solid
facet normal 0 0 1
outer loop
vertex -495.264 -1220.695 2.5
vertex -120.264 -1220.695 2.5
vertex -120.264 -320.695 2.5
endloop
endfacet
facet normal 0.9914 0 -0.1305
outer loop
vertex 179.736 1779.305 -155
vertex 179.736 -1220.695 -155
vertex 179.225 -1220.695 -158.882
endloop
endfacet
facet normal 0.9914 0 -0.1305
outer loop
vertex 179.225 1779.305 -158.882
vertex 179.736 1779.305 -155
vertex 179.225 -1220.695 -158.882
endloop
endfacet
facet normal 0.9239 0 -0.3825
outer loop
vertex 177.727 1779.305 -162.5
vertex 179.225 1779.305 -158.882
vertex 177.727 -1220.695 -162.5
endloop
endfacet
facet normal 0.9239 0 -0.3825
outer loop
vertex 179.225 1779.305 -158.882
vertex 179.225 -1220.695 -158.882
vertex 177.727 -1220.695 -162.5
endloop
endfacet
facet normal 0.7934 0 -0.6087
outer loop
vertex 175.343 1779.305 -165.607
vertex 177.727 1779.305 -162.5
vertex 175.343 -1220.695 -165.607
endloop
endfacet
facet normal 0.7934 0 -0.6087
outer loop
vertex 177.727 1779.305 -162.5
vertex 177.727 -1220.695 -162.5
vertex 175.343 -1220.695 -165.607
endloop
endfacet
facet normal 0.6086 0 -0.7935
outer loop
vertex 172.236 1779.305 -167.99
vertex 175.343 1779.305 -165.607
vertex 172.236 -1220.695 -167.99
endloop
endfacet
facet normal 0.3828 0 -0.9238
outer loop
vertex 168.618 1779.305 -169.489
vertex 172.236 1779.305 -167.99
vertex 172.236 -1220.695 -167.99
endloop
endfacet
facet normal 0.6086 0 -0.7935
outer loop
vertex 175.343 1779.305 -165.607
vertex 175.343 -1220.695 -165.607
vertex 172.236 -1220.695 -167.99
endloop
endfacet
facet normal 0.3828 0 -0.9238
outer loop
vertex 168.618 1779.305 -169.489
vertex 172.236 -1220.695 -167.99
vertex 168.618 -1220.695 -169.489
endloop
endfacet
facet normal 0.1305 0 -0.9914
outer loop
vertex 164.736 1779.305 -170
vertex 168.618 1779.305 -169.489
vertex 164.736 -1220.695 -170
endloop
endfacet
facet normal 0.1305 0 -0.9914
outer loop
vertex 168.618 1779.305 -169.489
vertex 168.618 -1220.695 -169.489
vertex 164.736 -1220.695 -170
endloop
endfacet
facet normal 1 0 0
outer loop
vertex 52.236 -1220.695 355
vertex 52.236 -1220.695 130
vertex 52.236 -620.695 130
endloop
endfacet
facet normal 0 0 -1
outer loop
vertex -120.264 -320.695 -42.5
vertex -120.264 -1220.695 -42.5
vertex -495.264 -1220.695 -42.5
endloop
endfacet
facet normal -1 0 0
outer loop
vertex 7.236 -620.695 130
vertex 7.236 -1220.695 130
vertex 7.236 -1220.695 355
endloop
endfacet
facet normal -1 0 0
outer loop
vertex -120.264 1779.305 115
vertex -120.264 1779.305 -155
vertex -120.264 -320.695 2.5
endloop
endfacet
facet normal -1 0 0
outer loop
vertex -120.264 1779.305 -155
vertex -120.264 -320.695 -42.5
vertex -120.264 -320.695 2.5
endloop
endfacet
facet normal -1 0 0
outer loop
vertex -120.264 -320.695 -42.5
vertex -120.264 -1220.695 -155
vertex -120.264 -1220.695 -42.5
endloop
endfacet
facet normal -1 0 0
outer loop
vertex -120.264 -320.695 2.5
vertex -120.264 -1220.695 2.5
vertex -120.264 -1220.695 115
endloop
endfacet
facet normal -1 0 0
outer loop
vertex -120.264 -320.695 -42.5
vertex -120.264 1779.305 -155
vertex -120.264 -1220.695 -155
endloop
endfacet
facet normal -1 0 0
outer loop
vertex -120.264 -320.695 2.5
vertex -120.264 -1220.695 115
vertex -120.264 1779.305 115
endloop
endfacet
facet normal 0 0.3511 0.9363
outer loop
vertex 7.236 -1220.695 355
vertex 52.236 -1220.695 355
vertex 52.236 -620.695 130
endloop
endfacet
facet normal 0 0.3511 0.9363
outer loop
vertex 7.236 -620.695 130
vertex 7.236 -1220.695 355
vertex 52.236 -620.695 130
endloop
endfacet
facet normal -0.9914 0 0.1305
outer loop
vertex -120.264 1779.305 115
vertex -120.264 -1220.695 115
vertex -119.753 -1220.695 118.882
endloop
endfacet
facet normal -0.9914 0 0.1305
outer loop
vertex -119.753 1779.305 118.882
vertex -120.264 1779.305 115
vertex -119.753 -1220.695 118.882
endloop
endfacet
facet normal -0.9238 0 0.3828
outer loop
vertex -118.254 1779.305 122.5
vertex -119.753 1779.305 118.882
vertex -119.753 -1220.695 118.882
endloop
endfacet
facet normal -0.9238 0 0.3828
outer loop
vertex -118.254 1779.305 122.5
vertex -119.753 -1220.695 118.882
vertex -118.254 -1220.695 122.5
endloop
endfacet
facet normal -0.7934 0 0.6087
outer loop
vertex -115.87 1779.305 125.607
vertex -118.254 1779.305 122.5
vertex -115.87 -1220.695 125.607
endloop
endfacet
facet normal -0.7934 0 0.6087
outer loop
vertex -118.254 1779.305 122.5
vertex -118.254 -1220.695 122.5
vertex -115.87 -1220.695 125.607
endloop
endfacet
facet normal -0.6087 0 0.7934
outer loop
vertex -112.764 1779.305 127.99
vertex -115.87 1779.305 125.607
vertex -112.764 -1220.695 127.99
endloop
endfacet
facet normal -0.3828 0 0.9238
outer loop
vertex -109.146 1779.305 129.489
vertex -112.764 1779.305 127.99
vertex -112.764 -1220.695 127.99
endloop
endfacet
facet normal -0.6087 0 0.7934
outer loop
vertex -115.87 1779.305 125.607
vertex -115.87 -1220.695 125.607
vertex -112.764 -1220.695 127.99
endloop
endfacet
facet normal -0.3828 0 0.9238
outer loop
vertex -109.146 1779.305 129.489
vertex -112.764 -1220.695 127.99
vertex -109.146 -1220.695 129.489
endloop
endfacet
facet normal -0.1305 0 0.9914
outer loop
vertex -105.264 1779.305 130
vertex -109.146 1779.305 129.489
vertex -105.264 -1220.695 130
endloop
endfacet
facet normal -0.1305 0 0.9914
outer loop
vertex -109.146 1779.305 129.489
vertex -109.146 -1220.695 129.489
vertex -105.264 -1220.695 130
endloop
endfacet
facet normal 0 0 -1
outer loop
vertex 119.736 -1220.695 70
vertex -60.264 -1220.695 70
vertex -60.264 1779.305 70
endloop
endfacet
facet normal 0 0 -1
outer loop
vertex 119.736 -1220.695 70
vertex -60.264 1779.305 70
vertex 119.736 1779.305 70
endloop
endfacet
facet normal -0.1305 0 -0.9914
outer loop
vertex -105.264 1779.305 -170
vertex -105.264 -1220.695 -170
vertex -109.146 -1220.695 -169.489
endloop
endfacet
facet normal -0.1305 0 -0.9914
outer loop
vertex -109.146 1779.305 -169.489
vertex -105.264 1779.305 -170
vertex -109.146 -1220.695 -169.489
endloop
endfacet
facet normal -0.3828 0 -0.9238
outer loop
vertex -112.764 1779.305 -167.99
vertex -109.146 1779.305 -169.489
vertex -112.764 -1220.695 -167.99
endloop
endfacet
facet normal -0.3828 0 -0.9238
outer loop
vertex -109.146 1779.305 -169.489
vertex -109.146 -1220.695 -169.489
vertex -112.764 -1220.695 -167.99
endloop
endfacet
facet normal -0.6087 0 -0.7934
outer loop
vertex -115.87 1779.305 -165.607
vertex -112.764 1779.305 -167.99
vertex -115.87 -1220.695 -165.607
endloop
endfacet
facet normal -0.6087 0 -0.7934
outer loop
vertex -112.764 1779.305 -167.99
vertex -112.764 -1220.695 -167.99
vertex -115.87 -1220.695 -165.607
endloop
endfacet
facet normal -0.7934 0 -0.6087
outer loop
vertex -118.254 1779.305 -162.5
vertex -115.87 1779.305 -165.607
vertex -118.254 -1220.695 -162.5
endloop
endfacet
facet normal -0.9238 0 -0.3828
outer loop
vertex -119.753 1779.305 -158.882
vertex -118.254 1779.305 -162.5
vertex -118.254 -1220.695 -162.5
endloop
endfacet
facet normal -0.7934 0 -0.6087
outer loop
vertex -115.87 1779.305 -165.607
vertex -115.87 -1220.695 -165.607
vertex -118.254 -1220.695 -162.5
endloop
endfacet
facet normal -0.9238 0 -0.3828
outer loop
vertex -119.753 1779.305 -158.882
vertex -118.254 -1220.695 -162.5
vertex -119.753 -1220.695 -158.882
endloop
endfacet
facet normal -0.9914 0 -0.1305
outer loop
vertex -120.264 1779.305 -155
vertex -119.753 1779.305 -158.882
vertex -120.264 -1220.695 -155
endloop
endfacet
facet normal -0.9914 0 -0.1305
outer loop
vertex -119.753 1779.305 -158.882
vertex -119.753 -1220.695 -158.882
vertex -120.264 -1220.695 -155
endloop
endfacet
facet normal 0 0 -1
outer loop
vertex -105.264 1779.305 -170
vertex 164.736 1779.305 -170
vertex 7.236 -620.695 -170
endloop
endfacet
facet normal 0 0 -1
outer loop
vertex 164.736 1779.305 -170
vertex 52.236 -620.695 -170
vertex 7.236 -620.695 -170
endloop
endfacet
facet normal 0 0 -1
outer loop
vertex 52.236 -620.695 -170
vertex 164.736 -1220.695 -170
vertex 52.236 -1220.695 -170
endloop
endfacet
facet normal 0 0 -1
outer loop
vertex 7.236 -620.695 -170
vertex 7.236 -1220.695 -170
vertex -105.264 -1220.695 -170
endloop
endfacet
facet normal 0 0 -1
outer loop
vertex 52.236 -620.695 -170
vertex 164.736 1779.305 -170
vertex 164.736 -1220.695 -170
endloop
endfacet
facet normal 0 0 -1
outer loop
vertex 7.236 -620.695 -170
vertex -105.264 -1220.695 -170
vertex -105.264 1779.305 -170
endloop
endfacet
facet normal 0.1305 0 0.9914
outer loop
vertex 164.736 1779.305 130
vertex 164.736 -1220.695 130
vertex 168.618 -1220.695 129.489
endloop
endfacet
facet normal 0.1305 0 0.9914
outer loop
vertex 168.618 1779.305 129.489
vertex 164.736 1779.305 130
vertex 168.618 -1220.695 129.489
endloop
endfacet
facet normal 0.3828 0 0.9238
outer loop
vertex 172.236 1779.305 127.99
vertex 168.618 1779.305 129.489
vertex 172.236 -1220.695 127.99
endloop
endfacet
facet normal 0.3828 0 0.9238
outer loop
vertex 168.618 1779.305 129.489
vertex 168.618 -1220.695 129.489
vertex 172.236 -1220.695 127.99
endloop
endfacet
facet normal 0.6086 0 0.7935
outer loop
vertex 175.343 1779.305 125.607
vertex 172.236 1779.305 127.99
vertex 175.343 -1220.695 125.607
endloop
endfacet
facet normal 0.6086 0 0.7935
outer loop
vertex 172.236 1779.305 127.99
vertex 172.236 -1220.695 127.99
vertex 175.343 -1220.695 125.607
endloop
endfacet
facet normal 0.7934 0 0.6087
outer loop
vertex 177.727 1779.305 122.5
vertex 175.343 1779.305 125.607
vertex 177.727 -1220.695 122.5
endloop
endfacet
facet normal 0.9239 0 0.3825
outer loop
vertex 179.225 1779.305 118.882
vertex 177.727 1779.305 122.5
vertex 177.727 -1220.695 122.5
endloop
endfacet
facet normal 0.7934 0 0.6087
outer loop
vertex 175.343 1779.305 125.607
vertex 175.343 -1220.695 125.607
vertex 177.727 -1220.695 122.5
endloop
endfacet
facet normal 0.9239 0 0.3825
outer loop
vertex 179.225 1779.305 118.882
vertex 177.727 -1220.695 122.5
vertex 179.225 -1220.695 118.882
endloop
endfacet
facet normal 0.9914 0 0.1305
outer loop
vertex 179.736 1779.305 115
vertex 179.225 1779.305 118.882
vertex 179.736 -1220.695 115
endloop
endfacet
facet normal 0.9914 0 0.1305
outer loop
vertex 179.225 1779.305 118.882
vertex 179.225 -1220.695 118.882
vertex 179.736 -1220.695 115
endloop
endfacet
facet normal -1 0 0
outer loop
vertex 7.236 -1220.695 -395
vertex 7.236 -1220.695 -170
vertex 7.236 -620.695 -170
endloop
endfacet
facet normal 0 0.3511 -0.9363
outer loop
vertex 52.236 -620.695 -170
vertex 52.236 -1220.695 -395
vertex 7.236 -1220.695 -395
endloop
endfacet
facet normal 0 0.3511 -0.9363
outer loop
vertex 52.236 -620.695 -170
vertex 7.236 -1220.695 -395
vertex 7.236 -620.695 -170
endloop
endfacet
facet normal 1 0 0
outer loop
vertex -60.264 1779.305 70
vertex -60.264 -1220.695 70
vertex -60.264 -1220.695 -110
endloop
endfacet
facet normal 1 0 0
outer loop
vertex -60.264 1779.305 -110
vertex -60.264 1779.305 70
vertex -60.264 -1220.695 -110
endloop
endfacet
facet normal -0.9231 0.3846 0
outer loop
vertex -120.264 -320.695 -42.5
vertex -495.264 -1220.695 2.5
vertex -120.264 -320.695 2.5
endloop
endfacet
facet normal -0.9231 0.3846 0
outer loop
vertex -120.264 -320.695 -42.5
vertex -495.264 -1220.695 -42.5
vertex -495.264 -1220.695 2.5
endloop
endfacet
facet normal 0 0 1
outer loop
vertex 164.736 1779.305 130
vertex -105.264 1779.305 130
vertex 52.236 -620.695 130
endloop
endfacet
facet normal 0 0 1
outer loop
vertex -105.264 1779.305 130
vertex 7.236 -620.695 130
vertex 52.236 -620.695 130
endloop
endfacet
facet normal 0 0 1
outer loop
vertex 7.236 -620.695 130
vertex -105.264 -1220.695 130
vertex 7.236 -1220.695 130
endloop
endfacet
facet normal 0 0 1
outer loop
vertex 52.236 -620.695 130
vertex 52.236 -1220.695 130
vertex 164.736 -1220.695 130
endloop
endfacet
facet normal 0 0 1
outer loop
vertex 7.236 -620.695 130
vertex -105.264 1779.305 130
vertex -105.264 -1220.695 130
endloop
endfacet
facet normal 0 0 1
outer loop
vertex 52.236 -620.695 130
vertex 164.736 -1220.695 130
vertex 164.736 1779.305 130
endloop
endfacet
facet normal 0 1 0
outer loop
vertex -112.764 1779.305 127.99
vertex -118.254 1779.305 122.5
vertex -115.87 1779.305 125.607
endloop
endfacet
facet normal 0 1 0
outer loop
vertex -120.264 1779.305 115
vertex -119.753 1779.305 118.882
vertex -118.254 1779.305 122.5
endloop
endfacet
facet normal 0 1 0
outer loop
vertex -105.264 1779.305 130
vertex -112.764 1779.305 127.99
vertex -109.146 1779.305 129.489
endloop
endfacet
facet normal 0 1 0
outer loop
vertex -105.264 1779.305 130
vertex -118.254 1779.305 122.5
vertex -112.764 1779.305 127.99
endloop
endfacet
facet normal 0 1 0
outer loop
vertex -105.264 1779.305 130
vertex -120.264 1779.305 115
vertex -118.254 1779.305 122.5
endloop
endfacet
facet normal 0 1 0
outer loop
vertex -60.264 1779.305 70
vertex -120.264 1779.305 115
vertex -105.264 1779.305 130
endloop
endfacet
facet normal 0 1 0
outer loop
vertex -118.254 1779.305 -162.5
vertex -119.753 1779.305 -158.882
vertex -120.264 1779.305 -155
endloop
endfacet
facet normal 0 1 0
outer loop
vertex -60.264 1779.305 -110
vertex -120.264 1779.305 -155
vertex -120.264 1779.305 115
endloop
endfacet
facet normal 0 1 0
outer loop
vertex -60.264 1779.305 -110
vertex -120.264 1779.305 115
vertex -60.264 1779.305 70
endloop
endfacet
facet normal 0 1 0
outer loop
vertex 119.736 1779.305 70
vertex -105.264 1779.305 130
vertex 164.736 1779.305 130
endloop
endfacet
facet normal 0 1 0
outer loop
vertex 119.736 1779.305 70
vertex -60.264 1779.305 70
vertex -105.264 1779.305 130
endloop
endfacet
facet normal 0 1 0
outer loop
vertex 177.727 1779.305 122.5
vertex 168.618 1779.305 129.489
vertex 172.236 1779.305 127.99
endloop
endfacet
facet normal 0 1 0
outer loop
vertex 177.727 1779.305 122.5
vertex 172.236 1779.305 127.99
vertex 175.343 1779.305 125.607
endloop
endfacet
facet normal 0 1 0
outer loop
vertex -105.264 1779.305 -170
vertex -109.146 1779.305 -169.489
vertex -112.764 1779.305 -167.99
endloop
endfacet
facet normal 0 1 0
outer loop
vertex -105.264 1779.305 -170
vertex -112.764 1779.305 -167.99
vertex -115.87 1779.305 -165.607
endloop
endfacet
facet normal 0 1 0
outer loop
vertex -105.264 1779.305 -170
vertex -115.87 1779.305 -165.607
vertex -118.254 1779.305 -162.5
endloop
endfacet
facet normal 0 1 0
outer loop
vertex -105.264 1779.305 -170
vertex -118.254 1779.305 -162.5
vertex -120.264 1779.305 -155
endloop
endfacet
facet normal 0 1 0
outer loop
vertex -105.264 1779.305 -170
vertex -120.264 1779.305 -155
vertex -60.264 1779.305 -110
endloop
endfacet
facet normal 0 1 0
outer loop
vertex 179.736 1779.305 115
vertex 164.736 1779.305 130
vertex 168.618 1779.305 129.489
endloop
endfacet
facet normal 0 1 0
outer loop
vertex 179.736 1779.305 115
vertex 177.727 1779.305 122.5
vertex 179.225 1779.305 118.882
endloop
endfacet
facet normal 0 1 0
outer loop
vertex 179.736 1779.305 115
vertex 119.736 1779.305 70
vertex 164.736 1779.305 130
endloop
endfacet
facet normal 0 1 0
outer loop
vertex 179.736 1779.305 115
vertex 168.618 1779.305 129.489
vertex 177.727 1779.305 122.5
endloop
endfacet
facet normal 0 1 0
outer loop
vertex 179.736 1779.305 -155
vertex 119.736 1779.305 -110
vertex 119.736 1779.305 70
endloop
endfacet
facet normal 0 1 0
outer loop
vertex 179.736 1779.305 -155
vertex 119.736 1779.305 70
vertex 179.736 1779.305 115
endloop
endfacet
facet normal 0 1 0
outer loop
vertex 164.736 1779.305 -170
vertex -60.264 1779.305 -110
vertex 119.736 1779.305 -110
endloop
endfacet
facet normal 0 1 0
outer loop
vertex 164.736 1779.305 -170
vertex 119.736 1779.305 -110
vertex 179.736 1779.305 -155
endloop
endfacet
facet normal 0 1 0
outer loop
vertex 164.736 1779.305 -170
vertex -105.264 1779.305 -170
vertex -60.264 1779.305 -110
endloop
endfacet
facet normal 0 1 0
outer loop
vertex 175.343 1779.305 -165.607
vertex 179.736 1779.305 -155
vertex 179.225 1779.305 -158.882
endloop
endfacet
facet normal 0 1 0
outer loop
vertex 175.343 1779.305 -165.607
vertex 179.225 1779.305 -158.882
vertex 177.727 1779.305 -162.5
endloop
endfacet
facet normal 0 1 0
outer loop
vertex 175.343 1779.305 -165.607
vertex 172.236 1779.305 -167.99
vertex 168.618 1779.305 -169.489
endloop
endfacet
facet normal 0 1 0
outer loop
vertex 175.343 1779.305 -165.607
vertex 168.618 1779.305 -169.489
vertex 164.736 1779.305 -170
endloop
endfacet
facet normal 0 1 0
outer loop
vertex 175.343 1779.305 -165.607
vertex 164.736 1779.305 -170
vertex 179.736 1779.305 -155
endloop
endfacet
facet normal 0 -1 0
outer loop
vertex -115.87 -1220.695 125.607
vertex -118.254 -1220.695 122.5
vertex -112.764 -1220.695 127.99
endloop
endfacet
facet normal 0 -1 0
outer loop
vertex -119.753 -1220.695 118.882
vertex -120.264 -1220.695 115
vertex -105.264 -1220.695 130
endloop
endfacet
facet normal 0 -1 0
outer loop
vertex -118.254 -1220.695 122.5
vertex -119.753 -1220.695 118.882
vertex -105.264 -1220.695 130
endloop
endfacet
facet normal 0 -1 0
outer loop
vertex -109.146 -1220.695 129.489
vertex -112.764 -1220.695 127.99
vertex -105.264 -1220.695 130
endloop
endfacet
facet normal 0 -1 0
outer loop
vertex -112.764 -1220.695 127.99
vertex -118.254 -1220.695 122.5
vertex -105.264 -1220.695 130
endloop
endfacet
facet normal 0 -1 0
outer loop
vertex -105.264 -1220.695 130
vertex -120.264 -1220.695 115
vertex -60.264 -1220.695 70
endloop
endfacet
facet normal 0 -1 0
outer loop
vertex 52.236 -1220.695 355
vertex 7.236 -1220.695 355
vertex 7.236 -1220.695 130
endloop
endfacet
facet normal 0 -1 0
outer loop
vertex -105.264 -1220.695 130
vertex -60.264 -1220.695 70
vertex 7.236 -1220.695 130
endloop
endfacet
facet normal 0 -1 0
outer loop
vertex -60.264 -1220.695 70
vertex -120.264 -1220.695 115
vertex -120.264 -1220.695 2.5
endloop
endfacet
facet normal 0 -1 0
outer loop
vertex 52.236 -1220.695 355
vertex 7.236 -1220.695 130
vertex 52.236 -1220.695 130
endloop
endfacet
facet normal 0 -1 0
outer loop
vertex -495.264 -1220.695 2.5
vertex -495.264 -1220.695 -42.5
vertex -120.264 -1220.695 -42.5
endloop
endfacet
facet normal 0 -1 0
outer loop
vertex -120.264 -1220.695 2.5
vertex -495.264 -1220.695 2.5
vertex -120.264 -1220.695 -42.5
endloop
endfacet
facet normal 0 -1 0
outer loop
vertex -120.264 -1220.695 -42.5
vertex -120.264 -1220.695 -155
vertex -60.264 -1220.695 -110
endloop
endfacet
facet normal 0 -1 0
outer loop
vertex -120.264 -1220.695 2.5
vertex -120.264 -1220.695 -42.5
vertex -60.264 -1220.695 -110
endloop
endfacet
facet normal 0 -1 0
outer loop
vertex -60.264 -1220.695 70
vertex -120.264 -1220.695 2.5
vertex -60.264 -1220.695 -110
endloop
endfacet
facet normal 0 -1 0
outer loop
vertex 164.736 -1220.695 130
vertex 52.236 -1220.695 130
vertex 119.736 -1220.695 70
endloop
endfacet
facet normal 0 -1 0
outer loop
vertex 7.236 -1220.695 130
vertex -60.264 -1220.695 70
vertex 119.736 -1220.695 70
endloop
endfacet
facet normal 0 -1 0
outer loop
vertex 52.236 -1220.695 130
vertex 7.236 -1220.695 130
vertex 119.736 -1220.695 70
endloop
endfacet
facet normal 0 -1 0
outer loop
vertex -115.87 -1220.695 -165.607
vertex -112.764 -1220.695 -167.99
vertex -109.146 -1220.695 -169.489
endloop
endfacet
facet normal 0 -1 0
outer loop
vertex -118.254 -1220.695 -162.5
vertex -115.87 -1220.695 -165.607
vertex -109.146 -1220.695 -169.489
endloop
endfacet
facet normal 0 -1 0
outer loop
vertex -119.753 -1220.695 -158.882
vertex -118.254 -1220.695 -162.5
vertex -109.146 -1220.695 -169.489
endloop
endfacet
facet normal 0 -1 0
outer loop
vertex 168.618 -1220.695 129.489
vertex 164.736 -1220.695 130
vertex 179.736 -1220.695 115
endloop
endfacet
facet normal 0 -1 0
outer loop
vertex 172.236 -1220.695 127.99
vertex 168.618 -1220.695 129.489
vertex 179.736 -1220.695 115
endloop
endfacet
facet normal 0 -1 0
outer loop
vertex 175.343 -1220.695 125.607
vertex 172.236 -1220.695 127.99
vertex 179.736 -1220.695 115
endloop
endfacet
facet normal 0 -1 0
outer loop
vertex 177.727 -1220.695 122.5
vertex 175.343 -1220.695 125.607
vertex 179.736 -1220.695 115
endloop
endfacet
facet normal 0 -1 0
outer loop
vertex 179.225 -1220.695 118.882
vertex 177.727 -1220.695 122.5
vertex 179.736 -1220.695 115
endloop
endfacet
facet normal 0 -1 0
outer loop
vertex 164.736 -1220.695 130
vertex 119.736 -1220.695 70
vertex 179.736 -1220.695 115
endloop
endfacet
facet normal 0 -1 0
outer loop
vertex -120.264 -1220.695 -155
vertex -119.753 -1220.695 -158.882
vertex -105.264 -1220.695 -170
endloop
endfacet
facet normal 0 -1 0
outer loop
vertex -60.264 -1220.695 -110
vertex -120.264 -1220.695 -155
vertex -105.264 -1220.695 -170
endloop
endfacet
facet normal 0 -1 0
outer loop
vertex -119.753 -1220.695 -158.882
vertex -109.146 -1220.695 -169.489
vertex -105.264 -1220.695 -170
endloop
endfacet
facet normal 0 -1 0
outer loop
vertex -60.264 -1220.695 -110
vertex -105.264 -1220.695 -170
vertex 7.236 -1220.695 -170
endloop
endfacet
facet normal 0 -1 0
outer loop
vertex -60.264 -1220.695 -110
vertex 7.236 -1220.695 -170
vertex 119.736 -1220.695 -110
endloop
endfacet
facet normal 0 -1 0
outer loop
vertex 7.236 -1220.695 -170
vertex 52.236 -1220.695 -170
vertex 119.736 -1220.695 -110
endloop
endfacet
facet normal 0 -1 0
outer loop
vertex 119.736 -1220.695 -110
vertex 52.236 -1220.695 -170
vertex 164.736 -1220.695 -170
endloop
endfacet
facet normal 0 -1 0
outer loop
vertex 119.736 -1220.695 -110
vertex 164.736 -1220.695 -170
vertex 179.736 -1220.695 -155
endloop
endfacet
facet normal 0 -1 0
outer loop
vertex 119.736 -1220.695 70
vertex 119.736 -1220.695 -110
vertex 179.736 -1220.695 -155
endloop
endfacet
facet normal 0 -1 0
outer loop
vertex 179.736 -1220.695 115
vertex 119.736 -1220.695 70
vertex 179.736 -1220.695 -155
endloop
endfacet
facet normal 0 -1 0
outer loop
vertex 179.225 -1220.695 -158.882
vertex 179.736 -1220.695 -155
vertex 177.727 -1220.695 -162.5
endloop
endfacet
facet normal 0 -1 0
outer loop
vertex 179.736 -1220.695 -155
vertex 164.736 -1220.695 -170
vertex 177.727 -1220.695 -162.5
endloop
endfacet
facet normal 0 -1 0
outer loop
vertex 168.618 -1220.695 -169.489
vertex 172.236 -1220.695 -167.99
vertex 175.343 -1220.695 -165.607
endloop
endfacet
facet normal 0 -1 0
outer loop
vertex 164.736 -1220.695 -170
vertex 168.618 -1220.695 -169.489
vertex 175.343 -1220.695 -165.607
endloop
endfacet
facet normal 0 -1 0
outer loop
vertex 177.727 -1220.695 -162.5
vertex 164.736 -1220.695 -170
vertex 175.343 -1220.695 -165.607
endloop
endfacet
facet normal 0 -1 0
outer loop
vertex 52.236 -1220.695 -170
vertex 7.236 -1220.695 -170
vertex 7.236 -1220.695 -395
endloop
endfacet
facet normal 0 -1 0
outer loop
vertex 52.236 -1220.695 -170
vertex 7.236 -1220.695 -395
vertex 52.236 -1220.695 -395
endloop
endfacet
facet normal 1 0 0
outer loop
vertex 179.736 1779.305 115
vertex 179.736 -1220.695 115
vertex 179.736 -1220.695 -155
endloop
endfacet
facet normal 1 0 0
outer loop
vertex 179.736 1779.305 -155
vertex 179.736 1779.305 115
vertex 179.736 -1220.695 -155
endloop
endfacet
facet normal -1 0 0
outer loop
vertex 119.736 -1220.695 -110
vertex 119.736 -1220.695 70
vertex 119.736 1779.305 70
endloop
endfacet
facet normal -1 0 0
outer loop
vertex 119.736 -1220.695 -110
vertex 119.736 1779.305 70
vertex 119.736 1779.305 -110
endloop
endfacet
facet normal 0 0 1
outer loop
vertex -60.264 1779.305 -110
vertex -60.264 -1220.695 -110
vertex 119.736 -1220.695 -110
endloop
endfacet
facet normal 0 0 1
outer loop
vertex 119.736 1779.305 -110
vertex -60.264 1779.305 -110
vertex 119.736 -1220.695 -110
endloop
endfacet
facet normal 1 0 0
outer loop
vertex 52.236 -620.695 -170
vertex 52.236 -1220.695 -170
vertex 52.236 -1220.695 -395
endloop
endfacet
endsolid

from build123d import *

# Parameters (mm, degrees)
SKETCH1_W           = 24
SKETCH1_H           = 24
BOSS_EXTRUDE1_DEPTH = 400
RIB2_START          = -3
RIB2_DEPTH          = 6
BOSS_EXTRUDE2_DEPTH = 3
SCALE3_SCALE        = 7.5


# Read off the part's stored shape, not the designer's step: Rib2
with BuildPart() as part:
    # Sketch1 → Boss-Extrude1 (new body)
    with BuildSketch(Plane(origin=(0, 0, 0), x_dir=(1, 0, 0), z_dir=(0, 1, 0))):
        with BuildLine():
            Line((2, 0), (38, 0))
            ThreePointArc((38, 0), (39.414213562, 0.585786438), (40, 2))
            Line((40, 2), (40, 38))
            ThreePointArc((40, 38), (39.414213562, 39.414213562), (38, 40))
            Line((38, 40), (2, 40))
            ThreePointArc((2, 40), (0.585786438, 39.414213562), (0, 38))
            Line((0, 38), (0, 2))
            ThreePointArc((0, 2), (0.585786438, 0.585786438), (2, 0))
        make_face()
        with Locations((20, 20)):
            Rectangle(SKETCH1_W, SKETCH1_H, mode=Mode.SUBTRACT)
    extrude(amount=BOSS_EXTRUDE1_DEPTH)

    # Rib2 outline → Rib2 (add)
    with BuildSketch(Plane.ZY.offset(-20).offset(RIB2_START)):
        Polygon((0, 80), (0, 0), (30, 0), align=None)
    rib2 = extrude(amount=RIB2_DEPTH)

    # Mirror1: Rib2 across plane
    add(rib2.mirror(Plane(origin=(0, 0, -20), x_dir=(1, 0, 0), z_dir=(0, 0, -1))))

    # Sketch4 → Boss-Extrude2 (add, symmetric)
    with BuildSketch(Plane(origin=(0, 0, -20), x_dir=(-1, 0, 0), z_dir=(0, 0, -1))):
        Polygon((50, 0), (0, 120), (0, 0), align=None)
    extrude(amount=BOSS_EXTRUDE2_DEPTH, both=True)


with BuildPart() as part_1:
    # Scale3: scaled about (18.502132923, 187.799191807, -20)
    add(part.part.scale(SCALE3_SCALE).moved(Location((-120.263864, -1220.694746745, 130))))


solid = part_1.part
